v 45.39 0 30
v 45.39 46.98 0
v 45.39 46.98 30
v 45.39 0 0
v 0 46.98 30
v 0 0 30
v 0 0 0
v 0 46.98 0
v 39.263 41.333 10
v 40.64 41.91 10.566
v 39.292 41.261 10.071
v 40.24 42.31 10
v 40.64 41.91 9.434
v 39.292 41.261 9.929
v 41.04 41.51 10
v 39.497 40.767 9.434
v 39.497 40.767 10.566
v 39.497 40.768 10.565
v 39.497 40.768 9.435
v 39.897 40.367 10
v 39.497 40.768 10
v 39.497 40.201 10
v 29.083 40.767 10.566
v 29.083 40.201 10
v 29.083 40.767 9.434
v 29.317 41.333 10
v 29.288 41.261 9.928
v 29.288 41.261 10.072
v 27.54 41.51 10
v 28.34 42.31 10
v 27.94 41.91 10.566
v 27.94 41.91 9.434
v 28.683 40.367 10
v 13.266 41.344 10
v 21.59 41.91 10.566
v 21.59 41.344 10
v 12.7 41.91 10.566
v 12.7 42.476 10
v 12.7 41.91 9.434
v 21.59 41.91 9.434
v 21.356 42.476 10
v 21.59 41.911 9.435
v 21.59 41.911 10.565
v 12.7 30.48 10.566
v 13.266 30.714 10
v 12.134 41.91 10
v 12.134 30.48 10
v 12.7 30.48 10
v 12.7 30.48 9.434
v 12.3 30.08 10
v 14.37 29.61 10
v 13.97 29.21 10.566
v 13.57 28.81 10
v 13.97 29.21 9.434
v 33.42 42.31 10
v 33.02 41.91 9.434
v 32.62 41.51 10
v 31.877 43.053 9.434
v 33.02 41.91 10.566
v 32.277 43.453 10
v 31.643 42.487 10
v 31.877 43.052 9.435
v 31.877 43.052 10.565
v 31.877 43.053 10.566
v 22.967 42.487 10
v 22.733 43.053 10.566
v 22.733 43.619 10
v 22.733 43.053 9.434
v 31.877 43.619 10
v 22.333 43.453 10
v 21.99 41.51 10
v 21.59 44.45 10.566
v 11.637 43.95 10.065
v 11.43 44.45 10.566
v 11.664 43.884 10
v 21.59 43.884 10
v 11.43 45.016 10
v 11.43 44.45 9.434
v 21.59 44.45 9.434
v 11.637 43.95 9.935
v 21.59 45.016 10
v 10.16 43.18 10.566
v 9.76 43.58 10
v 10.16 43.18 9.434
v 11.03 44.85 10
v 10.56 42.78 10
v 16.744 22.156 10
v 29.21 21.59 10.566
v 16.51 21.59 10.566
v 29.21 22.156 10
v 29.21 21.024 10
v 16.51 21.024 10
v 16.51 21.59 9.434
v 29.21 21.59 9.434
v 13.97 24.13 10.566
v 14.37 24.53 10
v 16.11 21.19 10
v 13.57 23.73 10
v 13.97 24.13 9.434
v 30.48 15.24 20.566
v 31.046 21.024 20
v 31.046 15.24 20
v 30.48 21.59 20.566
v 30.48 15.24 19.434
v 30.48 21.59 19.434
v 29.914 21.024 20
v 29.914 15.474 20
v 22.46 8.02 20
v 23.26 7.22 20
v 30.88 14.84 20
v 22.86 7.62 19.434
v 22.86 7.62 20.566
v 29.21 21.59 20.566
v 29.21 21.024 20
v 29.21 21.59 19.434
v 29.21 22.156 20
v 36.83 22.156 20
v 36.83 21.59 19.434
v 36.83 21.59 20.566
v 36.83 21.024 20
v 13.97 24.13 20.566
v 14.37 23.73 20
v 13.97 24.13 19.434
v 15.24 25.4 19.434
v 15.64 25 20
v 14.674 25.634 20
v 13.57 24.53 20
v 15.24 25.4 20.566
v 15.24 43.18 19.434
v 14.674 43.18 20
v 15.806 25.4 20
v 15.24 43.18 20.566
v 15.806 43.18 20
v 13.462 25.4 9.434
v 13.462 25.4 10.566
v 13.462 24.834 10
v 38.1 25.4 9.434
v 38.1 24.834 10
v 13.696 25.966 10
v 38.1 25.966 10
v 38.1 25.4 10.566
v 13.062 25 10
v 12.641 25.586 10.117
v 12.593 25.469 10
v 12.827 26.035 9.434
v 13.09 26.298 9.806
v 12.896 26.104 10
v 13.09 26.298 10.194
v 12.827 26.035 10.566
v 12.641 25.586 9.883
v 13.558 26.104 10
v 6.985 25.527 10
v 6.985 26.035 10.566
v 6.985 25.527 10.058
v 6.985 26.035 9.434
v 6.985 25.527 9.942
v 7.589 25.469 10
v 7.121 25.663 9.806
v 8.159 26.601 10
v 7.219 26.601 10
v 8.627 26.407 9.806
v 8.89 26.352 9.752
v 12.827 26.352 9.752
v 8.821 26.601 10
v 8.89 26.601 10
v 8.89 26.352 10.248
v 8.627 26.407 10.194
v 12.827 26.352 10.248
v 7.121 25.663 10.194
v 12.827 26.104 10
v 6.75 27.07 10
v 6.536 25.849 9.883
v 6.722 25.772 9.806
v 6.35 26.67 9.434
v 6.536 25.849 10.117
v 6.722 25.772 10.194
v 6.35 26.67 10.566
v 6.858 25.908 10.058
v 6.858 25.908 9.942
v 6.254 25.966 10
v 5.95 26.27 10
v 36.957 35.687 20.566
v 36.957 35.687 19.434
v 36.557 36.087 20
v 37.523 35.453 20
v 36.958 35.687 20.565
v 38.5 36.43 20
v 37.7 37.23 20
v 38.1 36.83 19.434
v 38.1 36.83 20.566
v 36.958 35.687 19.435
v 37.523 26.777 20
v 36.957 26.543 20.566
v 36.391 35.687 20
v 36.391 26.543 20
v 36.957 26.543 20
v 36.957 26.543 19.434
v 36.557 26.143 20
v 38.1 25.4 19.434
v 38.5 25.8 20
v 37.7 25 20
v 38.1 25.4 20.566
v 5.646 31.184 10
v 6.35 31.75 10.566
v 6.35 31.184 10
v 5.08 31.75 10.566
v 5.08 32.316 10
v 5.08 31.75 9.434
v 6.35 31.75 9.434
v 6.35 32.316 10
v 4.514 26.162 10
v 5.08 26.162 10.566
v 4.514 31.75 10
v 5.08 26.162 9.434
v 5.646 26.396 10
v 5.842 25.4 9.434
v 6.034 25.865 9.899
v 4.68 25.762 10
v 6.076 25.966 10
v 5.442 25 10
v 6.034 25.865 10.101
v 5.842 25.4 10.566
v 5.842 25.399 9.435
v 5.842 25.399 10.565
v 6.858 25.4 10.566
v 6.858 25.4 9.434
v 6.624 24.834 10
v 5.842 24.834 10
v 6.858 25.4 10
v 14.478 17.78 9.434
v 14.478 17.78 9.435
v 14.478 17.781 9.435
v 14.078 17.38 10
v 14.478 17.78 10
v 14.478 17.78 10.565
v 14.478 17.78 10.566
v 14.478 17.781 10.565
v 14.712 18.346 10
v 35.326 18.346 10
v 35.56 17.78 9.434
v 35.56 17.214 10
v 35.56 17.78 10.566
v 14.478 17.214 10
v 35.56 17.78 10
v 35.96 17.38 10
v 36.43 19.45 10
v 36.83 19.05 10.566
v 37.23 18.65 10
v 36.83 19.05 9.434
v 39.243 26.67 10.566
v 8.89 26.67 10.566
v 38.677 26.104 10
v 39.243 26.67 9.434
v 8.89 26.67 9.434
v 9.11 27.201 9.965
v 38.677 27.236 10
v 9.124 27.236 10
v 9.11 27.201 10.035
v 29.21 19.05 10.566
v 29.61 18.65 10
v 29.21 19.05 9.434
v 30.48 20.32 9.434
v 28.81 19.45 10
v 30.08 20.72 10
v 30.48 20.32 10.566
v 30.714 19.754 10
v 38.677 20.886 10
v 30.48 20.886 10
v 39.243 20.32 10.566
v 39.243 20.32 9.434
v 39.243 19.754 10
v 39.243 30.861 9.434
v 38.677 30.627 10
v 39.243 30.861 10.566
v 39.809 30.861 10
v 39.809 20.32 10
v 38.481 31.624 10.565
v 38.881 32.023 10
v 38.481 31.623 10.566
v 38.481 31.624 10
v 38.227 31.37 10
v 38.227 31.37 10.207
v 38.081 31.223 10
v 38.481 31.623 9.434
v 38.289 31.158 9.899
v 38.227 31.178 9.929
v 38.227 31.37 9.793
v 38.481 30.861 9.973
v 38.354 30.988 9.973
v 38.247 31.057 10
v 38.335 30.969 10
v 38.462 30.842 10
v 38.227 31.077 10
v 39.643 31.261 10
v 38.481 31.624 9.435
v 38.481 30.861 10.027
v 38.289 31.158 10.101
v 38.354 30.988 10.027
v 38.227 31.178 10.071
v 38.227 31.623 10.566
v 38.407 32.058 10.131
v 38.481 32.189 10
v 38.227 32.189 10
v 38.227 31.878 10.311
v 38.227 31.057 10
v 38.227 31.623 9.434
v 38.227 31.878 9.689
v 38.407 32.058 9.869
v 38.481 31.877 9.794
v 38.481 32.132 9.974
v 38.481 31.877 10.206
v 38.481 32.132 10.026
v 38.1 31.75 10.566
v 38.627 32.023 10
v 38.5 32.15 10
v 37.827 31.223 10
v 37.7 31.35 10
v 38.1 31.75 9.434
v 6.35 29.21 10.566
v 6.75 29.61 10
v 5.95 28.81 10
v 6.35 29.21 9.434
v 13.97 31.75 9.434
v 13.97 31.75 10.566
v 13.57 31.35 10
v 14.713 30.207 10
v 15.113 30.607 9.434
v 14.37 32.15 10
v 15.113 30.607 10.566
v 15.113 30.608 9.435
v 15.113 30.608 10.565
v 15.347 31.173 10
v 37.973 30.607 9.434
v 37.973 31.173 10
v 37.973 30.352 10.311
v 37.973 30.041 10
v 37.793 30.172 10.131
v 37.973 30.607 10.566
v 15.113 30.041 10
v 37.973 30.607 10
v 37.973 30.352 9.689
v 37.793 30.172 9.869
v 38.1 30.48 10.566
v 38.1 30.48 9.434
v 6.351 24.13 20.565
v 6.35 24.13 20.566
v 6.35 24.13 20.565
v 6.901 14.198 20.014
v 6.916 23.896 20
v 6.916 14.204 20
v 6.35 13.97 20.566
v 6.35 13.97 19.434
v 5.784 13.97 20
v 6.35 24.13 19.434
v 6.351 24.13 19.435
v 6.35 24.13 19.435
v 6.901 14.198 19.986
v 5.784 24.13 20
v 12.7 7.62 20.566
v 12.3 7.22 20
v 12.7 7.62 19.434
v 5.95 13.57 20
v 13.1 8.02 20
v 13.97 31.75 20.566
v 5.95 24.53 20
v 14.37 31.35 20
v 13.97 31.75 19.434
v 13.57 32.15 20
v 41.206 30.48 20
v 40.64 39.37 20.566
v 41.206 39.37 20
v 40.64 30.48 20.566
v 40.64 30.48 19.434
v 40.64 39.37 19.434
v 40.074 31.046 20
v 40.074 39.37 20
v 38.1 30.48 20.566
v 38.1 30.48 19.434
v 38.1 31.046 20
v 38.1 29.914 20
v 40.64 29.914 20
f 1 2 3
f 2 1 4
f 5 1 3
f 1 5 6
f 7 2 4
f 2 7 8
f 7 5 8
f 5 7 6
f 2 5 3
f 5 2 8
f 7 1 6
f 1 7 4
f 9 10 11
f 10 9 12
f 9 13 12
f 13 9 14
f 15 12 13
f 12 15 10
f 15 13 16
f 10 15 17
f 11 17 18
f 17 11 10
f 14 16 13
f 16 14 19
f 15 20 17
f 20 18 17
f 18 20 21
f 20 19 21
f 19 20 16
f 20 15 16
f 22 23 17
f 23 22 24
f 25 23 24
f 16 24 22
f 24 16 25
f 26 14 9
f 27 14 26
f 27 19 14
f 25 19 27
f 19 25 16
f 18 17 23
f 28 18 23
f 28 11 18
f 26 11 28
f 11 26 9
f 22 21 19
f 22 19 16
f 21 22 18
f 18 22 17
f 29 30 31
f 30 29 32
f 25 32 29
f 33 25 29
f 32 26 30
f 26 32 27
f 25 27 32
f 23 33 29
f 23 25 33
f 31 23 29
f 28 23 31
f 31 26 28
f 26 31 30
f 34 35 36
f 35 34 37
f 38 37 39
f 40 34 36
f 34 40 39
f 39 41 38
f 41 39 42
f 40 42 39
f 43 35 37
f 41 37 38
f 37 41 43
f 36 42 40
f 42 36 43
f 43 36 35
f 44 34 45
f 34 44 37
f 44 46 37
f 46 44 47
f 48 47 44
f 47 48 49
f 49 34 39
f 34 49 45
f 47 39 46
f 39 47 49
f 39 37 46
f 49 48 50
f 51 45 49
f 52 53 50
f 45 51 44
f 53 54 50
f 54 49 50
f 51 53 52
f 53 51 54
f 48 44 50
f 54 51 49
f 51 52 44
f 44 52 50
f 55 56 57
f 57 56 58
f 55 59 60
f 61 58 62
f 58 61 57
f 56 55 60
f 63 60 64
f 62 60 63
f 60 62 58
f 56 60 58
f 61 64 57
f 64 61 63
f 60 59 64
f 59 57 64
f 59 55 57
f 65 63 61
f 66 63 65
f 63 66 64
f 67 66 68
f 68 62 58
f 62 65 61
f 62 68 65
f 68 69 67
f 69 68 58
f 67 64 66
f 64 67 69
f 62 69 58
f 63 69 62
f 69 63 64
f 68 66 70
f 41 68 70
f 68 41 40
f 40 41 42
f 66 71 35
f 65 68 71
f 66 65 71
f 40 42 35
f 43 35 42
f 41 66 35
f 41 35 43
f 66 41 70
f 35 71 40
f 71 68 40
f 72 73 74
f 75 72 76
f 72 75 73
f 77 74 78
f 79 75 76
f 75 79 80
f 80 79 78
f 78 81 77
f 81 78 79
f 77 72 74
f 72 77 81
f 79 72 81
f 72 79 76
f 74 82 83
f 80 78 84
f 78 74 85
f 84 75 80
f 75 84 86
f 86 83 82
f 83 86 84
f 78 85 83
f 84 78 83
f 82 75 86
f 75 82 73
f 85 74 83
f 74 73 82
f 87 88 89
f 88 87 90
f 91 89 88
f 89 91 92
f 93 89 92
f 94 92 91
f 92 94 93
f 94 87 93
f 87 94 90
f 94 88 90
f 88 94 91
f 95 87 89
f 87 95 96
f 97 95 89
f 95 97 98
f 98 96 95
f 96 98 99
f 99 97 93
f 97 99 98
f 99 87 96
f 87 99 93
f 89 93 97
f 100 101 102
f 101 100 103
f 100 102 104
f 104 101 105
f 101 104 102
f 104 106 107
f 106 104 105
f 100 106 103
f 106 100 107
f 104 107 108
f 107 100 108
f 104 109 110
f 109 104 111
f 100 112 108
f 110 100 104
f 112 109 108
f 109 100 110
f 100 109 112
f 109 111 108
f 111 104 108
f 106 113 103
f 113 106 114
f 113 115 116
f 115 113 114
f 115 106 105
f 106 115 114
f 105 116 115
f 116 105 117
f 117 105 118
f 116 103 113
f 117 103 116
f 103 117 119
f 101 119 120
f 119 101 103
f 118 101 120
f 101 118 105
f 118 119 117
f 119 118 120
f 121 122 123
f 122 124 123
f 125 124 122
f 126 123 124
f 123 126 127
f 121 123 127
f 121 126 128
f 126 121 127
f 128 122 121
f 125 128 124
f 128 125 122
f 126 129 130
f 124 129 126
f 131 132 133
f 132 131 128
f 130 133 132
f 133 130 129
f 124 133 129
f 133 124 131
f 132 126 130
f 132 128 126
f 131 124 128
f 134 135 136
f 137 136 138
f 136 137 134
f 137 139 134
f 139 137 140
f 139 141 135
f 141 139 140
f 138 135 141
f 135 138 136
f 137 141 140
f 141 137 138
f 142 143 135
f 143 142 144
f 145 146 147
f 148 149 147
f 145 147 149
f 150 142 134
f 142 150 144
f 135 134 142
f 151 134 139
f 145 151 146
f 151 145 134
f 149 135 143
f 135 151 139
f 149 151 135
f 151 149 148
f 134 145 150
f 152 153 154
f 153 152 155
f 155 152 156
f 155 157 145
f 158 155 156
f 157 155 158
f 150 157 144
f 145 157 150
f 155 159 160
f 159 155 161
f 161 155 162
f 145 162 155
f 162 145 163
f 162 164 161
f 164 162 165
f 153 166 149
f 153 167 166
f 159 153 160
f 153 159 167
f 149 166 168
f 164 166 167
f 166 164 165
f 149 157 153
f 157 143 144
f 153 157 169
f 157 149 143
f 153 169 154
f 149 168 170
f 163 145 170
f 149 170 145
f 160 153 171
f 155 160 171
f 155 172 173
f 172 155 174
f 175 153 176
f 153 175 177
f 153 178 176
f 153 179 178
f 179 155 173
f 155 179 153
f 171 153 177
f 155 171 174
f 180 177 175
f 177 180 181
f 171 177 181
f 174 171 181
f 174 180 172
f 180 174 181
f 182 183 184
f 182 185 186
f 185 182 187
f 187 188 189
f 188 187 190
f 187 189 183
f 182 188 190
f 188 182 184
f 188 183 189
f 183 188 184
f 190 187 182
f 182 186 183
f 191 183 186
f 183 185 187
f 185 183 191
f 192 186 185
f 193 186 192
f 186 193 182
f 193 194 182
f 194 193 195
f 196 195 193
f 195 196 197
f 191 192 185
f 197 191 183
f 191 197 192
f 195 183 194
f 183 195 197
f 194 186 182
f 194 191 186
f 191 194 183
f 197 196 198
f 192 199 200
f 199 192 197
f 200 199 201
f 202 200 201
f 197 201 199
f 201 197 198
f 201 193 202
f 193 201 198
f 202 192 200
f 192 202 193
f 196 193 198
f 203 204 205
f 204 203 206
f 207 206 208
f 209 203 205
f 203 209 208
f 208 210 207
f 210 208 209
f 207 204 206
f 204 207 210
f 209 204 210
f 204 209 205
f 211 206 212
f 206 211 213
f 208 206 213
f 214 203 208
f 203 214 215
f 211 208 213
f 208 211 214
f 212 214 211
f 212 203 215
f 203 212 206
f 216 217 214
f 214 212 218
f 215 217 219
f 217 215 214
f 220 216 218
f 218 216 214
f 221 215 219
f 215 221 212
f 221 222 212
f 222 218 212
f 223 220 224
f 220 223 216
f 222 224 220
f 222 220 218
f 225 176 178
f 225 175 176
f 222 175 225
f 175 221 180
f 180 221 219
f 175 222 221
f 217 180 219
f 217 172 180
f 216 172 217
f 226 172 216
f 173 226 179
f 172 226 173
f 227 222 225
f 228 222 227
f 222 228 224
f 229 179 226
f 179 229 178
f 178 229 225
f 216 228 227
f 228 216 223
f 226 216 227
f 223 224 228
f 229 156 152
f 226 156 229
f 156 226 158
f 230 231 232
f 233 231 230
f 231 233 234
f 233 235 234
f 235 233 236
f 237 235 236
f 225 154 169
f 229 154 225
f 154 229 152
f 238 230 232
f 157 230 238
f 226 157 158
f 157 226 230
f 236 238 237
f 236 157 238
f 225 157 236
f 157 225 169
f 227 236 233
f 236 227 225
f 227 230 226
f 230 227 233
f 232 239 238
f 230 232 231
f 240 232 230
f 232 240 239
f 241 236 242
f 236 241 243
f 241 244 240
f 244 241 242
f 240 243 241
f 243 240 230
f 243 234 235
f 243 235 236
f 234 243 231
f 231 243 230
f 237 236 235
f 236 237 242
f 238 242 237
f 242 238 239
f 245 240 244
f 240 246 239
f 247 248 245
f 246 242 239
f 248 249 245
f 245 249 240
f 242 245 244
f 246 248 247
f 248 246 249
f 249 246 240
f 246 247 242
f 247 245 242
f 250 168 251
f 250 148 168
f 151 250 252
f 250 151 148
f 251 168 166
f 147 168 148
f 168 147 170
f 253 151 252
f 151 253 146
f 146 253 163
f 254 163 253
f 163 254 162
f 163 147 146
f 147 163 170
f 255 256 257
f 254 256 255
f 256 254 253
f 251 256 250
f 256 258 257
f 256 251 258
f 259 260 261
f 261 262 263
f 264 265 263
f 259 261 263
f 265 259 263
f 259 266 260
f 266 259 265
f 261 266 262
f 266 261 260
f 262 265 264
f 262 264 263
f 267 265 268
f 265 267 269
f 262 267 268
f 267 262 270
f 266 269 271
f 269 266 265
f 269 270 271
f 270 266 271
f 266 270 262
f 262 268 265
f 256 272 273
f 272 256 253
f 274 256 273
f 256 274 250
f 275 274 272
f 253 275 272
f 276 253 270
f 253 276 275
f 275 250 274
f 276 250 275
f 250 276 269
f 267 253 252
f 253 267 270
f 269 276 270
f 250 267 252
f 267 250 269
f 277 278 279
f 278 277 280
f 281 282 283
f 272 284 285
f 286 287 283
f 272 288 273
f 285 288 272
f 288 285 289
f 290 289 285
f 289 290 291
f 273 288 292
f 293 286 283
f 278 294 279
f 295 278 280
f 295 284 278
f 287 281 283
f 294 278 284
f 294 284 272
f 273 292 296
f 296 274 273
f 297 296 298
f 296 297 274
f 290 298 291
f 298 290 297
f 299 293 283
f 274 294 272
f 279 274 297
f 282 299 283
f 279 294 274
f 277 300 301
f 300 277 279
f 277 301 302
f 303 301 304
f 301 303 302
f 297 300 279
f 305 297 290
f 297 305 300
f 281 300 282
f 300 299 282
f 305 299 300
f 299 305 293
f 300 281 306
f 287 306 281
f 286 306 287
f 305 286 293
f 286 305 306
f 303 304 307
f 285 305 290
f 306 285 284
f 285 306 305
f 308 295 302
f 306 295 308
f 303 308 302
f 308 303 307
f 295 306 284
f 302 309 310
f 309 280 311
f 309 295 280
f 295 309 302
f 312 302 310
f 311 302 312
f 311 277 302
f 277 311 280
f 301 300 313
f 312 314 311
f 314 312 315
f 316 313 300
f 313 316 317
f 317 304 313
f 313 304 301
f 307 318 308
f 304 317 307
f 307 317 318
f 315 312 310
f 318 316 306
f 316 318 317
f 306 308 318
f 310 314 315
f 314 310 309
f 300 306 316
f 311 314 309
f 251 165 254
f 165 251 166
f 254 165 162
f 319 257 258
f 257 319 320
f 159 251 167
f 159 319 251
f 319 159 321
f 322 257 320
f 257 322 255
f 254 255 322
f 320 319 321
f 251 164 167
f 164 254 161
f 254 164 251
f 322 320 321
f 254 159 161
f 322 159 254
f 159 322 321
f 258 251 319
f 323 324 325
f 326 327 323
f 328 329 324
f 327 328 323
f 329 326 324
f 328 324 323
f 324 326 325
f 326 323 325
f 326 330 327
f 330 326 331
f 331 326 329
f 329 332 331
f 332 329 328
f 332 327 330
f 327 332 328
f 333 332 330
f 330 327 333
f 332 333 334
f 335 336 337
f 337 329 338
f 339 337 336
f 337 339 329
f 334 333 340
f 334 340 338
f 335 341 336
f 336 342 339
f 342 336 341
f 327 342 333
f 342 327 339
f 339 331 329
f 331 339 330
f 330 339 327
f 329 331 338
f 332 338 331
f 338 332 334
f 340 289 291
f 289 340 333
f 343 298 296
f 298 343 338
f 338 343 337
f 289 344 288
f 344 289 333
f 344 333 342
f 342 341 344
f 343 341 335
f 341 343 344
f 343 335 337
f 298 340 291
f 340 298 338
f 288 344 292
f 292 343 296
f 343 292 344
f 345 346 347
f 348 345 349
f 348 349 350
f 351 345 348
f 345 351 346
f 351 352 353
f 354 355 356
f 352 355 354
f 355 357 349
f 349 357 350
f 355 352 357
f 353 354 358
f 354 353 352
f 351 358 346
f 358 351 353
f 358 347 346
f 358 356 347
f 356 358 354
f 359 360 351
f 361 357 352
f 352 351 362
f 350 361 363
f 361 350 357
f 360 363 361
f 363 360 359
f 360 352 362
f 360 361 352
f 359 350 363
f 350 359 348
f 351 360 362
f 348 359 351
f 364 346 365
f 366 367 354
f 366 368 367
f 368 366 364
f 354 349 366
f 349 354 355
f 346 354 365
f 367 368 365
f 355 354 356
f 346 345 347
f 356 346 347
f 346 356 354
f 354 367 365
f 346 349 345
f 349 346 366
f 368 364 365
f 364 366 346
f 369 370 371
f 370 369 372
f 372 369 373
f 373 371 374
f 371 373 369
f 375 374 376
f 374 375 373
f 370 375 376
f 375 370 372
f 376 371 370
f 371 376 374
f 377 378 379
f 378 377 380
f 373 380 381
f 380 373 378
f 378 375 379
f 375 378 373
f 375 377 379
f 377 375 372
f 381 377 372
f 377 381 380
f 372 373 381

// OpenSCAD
difference() 
{ 
cube([45.390,46.980,30.000], center = false); 
 translate([40.640,41.910,10.000]) rotate([0.0,90.0,225.0]) 
 linear_extrude(height = 1.616, center = false) 
 rotate([0,0,45]) square(size = 0.800, center = true); 
 translate([39.497,40.767,10.000]) rotate([0.0,90.0,180.0]) 
 linear_extrude(height = 10.414, center = false) 
 rotate([0,0,45]) square(size = 0.800, center = true); 
 translate([29.083,40.767,10.000]) rotate([0.0,90.0,135.0]) 
 linear_extrude(height = 1.616, center = false) 
 rotate([0,0,45]) square(size = 0.800, center = true); 
 translate([21.590,41.910,10.000]) rotate([0.0,90.0,180.0]) 
 linear_extrude(height = 8.890, center = false) 
 rotate([0,0,45]) square(size = 0.800, center = true); 
 translate([12.700,41.910,10.000]) rotate([0.0,90.0,-90.0]) 
 linear_extrude(height = 11.430, center = false) 
 rotate([0,0,45]) square(size = 0.800, center = true); 
 translate([12.700,30.480,10.000]) rotate([0.0,90.0,-45.0]) 
 linear_extrude(height = 1.796, center = false) 
 rotate([0,0,45]) square(size = 0.800, center = true); 
 translate([33.020,41.910,10.000]) rotate([0.0,90.0,135.0]) 
 linear_extrude(height = 1.616, center = false) 
 rotate([0,0,45]) square(size = 0.800, center = true); 
 translate([31.877,43.053,10.000]) rotate([0.0,90.0,180.0]) 
 linear_extrude(height = 9.144, center = false) 
 rotate([0,0,45]) square(size = 0.800, center = true); 
 translate([22.733,43.053,10.000]) rotate([0.0,90.0,225.0]) 
 linear_extrude(height = 1.616, center = false) 
 rotate([0,0,45]) square(size = 0.800, center = true); 
 translate([21.590,44.450,10.000]) rotate([0.0,90.0,180.0]) 
 linear_extrude(height = 10.160, center = false) 
 rotate([0,0,45]) square(size = 0.800, center = true); 
 translate([11.430,44.450,10.000]) rotate([0.0,90.0,225.0]) 
 linear_extrude(height = 1.796, center = false) 
 rotate([0,0,45]) square(size = 0.800, center = true); 
 translate([29.210,21.590,10.000]) rotate([0.0,90.0,180.0]) 
 linear_extrude(height = 12.700, center = false) 
 rotate([0,0,45]) square(size = 0.800, center = true); 
 translate([16.510,21.590,10.000]) rotate([0.0,90.0,135.0]) 
 linear_extrude(height = 3.592, center = false) 
 rotate([0,0,45]) square(size = 0.800, center = true); 
 translate([30.480,21.590,20.000]) rotate([0.0,90.0,-90.0]) 
 linear_extrude(height = 6.350, center = false) 
 rotate([0,0,45]) square(size = 0.800, center = true); 
 translate([30.480,15.240,20.000]) rotate([0.0,90.0,225.0]) 
 linear_extrude(height = 10.776, center = false) 
 rotate([0,0,45]) square(size = 0.800, center = true); 
 translate([30.480,21.590,20.000]) rotate([0.0,90.0,180.0]) 
 linear_extrude(height = 1.270, center = false) 
 rotate([0,0,45]) square(size = 0.800, center = true); 
 translate([36.830,21.590,20.000]) rotate([0.0,90.0,180.0]) 
 linear_extrude(height = 6.350, center = false) 
 rotate([0,0,45]) square(size = 0.800, center = true); 
 translate([13.970,24.130,20.000]) rotate([0.0,90.0,45.0]) 
 linear_extrude(height = 1.796, center = false) 
 rotate([0,0,45]) square(size = 0.800, center = true); 
 translate([15.240,25.400,20.000]) rotate([0.0,90.0,90.0]) 
 linear_extrude(height = 17.780, center = false) 
 rotate([0,0,45]) square(size = 0.800, center = true); 
 translate([38.100,25.400,10.000]) rotate([0.0,90.0,180.0]) 
 linear_extrude(height = 24.638, center = false) 
 rotate([0,0,45]) square(size = 0.800, center = true); 
 translate([13.462,25.400,10.000]) rotate([0.0,90.0,135.0]) 
 linear_extrude(height = 0.898, center = false) 
 rotate([0,0,45]) square(size = 0.800, center = true); 
 translate([12.827,26.035,10.000]) rotate([0.0,90.0,180.0]) 
 linear_extrude(height = 5.842, center = false) 
 rotate([0,0,45]) square(size = 0.800, center = true); 
 translate([6.985,26.035,10.000]) rotate([0.0,90.0,135.0]) 
 linear_extrude(height = 0.898, center = false) 
 rotate([0,0,45]) square(size = 0.800, center = true); 
 translate([38.100,36.830,20.000]) rotate([0.0,90.0,225.0]) 
 linear_extrude(height = 1.616, center = false) 
 rotate([0,0,45]) square(size = 0.800, center = true); 
 translate([36.957,35.687,20.000]) rotate([0.0,90.0,-90.0]) 
 linear_extrude(height = 9.144, center = false) 
 rotate([0,0,45]) square(size = 0.800, center = true); 
 translate([36.957,26.543,20.000]) rotate([0.0,90.0,-45.0]) 
 linear_extrude(height = 1.616, center = false) 
 rotate([0,0,45]) square(size = 0.800, center = true); 
 translate([6.350,31.750,10.000]) rotate([0.0,90.0,180.0]) 
 linear_extrude(height = 1.270, center = false) 
 rotate([0,0,45]) square(size = 0.800, center = true); 
 translate([5.080,31.750,10.000]) rotate([0.0,90.0,-90.0]) 
 linear_extrude(height = 5.588, center = false) 
 rotate([0,0,45]) square(size = 0.800, center = true); 
 translate([5.080,26.162,10.000]) rotate([0.0,90.0,-45.0]) 
 linear_extrude(height = 1.078, center = false) 
 rotate([0,0,45]) square(size = 0.800, center = true); 
 translate([5.842,25.400,10.000]) rotate([0.0,90.0,0.0]) 
 linear_extrude(height = 1.016, center = false) 
 rotate([0,0,45]) square(size = 0.800, center = true); 
 translate([6.858,25.400,10.000]) rotate([0.0,90.0,-45.0]) 
 linear_extrude(height = 10.776, center = false) 
 rotate([0,0,45]) square(size = 0.800, center = true); 
 translate([14.478,17.780,10.000]) rotate([0.0,90.0,0.0]) 
 linear_extrude(height = 21.082, center = false) 
 rotate([0,0,45]) square(size = 0.800, center = true); 
 translate([35.560,17.780,10.000]) rotate([0.0,90.0,45.0]) 
 linear_extrude(height = 1.796, center = false) 
 rotate([0,0,45]) square(size = 0.800, center = true); 
 translate([39.243,26.670,10.000]) rotate([0.0,90.0,180.0]) 
 linear_extrude(height = 25.273, center = false) 
 rotate([0,0,45]) square(size = 0.800, center = true); 
 translate([29.210,19.050,10.000]) rotate([0.0,90.0,45.0]) 
 linear_extrude(height = 1.796, center = false) 
 rotate([0,0,45]) square(size = 0.800, center = true); 
 translate([30.480,20.320,10.000]) rotate([0.0,90.0,0.0]) 
 linear_extrude(height = 8.763, center = false) 
 rotate([0,0,45]) square(size = 0.800, center = true); 
 translate([39.243,26.670,10.000]) rotate([0.0,90.0,90.0]) 
 linear_extrude(height = 4.191, center = false) 
 rotate([0,0,45]) square(size = 0.800, center = true); 
 translate([39.243,20.320,10.000]) rotate([0.0,90.0,90.0]) 
 linear_extrude(height = 6.350, center = false) 
 rotate([0,0,45]) square(size = 0.800, center = true); 
 translate([39.243,30.861,10.000]) rotate([0.0,90.0,135.0]) 
 linear_extrude(height = 1.078, center = false) 
 rotate([0,0,45]) square(size = 0.800, center = true); 
 translate([38.481,31.623,10.000]) rotate([0.0,90.0,180.0]) 
 linear_extrude(height = 0.254, center = false) 
 rotate([0,0,45]) square(size = 0.800, center = true); 
 translate([38.227,31.623,10.000]) rotate([0.0,90.0,135.0]) 
 linear_extrude(height = 0.180, center = false) 
 rotate([0,0,45]) square(size = 0.800, center = true); 
 translate([13.970,26.670,10.000]) rotate([0.0,90.0,180.0]) 
 linear_extrude(height = 5.080, center = false) 
 rotate([0,0,45]) square(size = 0.800, center = true); 
 translate([8.890,26.670,10.000]) rotate([0.0,90.0,135.0]) 
 linear_extrude(height = 3.592, center = false) 
 rotate([0,0,45]) square(size = 0.800, center = true); 
 translate([13.970,31.750,10.000]) rotate([0.0,90.0,-45.0]) 
 linear_extrude(height = 1.616, center = false) 
 rotate([0,0,45]) square(size = 0.800, center = true); 
 translate([15.113,30.607,10.000]) rotate([0.0,90.0,0.0]) 
 linear_extrude(height = 22.860, center = false) 
 rotate([0,0,45]) square(size = 0.800, center = true); 
 translate([37.973,30.607,10.000]) rotate([0.0,90.0,-45.0]) 
 linear_extrude(height = 0.180, center = false) 
 rotate([0,0,45]) square(size = 0.800, center = true); 
 translate([6.350,24.130,20.000]) rotate([0.0,90.0,-90.0]) 
 linear_extrude(height = 10.160, center = false) 
 rotate([0,0,45]) square(size = 0.800, center = true); 
 translate([6.350,13.970,20.000]) rotate([0.0,90.0,-45.0]) 
 linear_extrude(height = 8.980, center = false) 
 rotate([0,0,45]) square(size = 0.800, center = true); 
 translate([13.970,31.750,20.000]) rotate([0.0,90.0,225.0]) 
 linear_extrude(height = 10.776, center = false) 
 rotate([0,0,45]) square(size = 0.800, center = true); 
 translate([40.640,39.370,20.000]) rotate([0.0,90.0,-90.0]) 
 linear_extrude(height = 8.890, center = false) 
 rotate([0,0,45]) square(size = 0.800, center = true); 
 translate([40.640,30.480,20.000]) rotate([0.0,90.0,180.0]) 
 linear_extrude(height = 2.540, center = false) 
 rotate([0,0,45]) square(size = 0.800, center = true); 
} 
